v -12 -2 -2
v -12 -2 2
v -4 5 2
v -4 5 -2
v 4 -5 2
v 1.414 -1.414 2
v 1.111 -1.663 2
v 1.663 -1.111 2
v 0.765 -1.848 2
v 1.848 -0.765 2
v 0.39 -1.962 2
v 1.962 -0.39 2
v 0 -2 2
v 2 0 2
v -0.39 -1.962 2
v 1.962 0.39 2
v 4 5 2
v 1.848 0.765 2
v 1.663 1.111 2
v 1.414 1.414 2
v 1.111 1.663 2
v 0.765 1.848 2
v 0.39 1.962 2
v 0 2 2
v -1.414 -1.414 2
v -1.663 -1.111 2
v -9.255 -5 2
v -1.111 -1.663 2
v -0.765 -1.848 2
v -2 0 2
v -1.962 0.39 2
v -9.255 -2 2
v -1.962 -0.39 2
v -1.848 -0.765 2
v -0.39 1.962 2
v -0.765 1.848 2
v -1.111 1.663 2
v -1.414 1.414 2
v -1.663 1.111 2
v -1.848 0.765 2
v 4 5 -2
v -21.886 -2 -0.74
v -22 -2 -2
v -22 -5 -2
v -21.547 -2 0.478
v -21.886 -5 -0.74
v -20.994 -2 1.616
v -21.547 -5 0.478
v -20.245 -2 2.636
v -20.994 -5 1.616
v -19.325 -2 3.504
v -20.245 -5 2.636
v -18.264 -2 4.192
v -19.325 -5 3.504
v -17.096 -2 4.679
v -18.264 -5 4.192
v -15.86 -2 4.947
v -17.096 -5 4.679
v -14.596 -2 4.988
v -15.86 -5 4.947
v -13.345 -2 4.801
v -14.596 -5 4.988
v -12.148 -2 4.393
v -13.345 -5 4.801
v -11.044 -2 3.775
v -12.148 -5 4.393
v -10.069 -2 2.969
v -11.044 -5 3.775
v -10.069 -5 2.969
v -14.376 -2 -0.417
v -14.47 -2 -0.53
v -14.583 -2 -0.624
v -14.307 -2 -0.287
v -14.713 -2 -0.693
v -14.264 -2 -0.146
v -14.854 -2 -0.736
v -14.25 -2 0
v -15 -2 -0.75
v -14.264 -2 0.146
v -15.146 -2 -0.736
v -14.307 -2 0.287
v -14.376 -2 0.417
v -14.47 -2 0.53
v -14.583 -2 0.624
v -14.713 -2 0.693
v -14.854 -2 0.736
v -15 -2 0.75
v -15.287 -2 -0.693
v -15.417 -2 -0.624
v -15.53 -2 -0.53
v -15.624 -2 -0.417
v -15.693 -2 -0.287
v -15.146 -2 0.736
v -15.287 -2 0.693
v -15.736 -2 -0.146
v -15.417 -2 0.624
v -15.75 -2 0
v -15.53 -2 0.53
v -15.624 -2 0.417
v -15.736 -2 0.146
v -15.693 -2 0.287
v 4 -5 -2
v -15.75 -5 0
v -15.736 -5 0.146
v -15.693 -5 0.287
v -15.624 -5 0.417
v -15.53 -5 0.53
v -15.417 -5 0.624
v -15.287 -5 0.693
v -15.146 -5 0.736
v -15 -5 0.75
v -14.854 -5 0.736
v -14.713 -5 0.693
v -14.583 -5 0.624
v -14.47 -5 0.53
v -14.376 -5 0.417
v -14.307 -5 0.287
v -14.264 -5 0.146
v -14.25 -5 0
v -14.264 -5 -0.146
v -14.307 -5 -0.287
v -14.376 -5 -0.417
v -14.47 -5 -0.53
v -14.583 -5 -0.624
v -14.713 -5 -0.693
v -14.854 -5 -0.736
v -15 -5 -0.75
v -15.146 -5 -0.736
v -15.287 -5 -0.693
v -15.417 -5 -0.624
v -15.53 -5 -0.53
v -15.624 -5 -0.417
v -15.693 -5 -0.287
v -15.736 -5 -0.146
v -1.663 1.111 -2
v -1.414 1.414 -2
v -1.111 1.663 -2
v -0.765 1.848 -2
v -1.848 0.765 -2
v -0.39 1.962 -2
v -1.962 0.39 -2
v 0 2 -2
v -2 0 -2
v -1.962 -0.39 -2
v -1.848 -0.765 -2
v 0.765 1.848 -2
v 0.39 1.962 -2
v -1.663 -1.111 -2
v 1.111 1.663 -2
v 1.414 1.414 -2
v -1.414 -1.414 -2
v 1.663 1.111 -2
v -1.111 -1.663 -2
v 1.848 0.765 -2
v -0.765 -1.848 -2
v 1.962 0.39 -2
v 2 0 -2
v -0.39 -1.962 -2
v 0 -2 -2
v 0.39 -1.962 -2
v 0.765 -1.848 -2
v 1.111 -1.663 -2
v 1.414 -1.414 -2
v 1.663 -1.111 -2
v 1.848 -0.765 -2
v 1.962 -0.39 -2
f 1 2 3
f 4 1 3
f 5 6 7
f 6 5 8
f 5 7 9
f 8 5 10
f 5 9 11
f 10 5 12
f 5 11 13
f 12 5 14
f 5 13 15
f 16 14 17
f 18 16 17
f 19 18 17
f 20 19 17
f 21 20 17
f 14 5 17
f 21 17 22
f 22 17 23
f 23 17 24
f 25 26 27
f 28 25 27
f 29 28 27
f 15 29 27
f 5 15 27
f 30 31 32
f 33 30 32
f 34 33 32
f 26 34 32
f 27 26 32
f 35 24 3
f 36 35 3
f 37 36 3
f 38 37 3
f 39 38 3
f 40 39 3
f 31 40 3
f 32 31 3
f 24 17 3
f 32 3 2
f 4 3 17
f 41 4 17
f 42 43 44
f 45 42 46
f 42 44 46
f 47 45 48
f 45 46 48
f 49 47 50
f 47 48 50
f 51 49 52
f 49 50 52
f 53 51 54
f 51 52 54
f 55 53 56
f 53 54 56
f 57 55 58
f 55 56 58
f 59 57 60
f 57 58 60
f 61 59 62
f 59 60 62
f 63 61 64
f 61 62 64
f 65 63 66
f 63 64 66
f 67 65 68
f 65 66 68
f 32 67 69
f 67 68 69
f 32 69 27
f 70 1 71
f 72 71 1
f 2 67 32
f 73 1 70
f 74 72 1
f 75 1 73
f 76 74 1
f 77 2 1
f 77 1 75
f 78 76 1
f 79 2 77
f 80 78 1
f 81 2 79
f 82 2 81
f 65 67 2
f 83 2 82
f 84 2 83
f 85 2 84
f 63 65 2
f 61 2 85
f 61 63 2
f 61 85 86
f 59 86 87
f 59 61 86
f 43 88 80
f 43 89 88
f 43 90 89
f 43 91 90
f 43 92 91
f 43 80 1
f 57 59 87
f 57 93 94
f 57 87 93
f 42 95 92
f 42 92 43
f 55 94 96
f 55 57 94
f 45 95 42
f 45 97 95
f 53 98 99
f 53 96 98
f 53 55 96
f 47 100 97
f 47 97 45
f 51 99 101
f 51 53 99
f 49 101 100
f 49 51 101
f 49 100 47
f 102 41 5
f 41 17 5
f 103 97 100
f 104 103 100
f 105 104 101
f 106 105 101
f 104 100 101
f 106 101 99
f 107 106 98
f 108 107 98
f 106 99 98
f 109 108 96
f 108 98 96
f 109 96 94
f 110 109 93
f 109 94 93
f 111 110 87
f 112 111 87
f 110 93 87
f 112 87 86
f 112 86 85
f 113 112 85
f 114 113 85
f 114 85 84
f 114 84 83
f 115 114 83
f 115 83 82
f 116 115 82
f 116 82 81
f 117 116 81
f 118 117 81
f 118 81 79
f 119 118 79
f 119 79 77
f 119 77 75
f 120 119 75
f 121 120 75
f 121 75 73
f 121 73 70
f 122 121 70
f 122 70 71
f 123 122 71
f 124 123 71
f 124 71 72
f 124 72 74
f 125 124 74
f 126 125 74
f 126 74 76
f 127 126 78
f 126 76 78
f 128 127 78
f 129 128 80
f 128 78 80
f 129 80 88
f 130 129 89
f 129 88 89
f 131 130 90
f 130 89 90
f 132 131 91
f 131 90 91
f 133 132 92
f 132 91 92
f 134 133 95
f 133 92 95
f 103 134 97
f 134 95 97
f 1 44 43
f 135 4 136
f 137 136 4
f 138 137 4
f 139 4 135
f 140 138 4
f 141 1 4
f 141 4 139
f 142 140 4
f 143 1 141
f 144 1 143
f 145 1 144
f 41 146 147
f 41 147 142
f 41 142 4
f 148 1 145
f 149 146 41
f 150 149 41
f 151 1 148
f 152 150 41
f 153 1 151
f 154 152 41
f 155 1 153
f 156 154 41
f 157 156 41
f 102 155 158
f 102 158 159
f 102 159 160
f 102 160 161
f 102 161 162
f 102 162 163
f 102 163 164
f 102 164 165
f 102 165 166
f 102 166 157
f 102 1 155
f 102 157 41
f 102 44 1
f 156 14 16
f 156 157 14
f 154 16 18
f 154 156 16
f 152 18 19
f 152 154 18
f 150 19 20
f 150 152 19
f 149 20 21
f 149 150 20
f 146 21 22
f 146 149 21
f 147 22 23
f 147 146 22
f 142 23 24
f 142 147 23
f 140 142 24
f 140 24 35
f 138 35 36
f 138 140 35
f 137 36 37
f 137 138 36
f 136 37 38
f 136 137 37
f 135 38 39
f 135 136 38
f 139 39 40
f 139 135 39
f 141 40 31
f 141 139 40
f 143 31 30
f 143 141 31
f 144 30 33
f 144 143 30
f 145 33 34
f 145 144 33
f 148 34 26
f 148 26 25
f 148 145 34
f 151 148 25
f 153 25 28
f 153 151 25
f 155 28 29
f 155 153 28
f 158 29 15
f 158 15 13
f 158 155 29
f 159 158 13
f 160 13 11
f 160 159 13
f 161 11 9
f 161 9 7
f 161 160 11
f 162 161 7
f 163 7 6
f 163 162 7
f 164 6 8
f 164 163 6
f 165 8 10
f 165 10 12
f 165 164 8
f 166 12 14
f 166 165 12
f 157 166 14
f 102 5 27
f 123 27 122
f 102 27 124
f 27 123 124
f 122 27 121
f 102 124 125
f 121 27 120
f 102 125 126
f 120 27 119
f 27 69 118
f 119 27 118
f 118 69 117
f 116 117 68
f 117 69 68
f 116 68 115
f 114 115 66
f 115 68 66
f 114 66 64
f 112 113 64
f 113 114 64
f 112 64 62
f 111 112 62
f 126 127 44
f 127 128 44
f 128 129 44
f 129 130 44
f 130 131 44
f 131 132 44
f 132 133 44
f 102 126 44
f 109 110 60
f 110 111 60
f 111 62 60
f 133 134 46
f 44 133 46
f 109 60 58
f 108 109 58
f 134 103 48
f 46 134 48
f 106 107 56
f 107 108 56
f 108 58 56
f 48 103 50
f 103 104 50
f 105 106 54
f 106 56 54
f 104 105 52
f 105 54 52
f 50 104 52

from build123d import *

# Parameters (mm, degrees)
SKETCH_R         = 2
EXTRUDE_DEPTH    = 2
SKETCH001_R      = 0.75
HOLE_DEPTH       = 3.001
SKETCH002_W      = 3
SKETCH002_H      = 3
REVOLUTION_ANGLE = -180


with BuildPart() as part:
    # Sketch → Extrude (new body, symmetric)
    with BuildSketch(Plane.XY):
        Polygon((-4, 5), (4, 5), (4, -5), (-4, -5), (-19, -5), (-19, -2), (-12, -2), align=None)
        Circle(SKETCH_R, mode=Mode.SUBTRACT)
    extrude(amount=EXTRUDE_DEPTH, both=True)

    # Sketch001 (on Face6 of Extrude) → Hole (cut, through all)
    with BuildSketch(Plane(origin=(0, -2, 0), x_dir=(-1, 0, 0), z_dir=(0, 1, 0))):
        with Locations((15, 0)):
            Circle(SKETCH001_R)
    extrude(amount=-HOLE_DEPTH, mode=Mode.SUBTRACT)

    # Sketch002 (on Face4 of Hole) → Revolution (revolve)
    with BuildSketch(Plane(origin=(0, 0, -2), x_dir=(1, 0, 0), z_dir=(0, 0, -1))):
        with Locations((-20.5, 3.5)):
            Rectangle(SKETCH002_W, SKETCH002_H)
    revolve(axis=Axis((-15, -5, -2), (0, -1, 0)), revolution_arc=REVOLUTION_ANGLE)


solid = part.part
